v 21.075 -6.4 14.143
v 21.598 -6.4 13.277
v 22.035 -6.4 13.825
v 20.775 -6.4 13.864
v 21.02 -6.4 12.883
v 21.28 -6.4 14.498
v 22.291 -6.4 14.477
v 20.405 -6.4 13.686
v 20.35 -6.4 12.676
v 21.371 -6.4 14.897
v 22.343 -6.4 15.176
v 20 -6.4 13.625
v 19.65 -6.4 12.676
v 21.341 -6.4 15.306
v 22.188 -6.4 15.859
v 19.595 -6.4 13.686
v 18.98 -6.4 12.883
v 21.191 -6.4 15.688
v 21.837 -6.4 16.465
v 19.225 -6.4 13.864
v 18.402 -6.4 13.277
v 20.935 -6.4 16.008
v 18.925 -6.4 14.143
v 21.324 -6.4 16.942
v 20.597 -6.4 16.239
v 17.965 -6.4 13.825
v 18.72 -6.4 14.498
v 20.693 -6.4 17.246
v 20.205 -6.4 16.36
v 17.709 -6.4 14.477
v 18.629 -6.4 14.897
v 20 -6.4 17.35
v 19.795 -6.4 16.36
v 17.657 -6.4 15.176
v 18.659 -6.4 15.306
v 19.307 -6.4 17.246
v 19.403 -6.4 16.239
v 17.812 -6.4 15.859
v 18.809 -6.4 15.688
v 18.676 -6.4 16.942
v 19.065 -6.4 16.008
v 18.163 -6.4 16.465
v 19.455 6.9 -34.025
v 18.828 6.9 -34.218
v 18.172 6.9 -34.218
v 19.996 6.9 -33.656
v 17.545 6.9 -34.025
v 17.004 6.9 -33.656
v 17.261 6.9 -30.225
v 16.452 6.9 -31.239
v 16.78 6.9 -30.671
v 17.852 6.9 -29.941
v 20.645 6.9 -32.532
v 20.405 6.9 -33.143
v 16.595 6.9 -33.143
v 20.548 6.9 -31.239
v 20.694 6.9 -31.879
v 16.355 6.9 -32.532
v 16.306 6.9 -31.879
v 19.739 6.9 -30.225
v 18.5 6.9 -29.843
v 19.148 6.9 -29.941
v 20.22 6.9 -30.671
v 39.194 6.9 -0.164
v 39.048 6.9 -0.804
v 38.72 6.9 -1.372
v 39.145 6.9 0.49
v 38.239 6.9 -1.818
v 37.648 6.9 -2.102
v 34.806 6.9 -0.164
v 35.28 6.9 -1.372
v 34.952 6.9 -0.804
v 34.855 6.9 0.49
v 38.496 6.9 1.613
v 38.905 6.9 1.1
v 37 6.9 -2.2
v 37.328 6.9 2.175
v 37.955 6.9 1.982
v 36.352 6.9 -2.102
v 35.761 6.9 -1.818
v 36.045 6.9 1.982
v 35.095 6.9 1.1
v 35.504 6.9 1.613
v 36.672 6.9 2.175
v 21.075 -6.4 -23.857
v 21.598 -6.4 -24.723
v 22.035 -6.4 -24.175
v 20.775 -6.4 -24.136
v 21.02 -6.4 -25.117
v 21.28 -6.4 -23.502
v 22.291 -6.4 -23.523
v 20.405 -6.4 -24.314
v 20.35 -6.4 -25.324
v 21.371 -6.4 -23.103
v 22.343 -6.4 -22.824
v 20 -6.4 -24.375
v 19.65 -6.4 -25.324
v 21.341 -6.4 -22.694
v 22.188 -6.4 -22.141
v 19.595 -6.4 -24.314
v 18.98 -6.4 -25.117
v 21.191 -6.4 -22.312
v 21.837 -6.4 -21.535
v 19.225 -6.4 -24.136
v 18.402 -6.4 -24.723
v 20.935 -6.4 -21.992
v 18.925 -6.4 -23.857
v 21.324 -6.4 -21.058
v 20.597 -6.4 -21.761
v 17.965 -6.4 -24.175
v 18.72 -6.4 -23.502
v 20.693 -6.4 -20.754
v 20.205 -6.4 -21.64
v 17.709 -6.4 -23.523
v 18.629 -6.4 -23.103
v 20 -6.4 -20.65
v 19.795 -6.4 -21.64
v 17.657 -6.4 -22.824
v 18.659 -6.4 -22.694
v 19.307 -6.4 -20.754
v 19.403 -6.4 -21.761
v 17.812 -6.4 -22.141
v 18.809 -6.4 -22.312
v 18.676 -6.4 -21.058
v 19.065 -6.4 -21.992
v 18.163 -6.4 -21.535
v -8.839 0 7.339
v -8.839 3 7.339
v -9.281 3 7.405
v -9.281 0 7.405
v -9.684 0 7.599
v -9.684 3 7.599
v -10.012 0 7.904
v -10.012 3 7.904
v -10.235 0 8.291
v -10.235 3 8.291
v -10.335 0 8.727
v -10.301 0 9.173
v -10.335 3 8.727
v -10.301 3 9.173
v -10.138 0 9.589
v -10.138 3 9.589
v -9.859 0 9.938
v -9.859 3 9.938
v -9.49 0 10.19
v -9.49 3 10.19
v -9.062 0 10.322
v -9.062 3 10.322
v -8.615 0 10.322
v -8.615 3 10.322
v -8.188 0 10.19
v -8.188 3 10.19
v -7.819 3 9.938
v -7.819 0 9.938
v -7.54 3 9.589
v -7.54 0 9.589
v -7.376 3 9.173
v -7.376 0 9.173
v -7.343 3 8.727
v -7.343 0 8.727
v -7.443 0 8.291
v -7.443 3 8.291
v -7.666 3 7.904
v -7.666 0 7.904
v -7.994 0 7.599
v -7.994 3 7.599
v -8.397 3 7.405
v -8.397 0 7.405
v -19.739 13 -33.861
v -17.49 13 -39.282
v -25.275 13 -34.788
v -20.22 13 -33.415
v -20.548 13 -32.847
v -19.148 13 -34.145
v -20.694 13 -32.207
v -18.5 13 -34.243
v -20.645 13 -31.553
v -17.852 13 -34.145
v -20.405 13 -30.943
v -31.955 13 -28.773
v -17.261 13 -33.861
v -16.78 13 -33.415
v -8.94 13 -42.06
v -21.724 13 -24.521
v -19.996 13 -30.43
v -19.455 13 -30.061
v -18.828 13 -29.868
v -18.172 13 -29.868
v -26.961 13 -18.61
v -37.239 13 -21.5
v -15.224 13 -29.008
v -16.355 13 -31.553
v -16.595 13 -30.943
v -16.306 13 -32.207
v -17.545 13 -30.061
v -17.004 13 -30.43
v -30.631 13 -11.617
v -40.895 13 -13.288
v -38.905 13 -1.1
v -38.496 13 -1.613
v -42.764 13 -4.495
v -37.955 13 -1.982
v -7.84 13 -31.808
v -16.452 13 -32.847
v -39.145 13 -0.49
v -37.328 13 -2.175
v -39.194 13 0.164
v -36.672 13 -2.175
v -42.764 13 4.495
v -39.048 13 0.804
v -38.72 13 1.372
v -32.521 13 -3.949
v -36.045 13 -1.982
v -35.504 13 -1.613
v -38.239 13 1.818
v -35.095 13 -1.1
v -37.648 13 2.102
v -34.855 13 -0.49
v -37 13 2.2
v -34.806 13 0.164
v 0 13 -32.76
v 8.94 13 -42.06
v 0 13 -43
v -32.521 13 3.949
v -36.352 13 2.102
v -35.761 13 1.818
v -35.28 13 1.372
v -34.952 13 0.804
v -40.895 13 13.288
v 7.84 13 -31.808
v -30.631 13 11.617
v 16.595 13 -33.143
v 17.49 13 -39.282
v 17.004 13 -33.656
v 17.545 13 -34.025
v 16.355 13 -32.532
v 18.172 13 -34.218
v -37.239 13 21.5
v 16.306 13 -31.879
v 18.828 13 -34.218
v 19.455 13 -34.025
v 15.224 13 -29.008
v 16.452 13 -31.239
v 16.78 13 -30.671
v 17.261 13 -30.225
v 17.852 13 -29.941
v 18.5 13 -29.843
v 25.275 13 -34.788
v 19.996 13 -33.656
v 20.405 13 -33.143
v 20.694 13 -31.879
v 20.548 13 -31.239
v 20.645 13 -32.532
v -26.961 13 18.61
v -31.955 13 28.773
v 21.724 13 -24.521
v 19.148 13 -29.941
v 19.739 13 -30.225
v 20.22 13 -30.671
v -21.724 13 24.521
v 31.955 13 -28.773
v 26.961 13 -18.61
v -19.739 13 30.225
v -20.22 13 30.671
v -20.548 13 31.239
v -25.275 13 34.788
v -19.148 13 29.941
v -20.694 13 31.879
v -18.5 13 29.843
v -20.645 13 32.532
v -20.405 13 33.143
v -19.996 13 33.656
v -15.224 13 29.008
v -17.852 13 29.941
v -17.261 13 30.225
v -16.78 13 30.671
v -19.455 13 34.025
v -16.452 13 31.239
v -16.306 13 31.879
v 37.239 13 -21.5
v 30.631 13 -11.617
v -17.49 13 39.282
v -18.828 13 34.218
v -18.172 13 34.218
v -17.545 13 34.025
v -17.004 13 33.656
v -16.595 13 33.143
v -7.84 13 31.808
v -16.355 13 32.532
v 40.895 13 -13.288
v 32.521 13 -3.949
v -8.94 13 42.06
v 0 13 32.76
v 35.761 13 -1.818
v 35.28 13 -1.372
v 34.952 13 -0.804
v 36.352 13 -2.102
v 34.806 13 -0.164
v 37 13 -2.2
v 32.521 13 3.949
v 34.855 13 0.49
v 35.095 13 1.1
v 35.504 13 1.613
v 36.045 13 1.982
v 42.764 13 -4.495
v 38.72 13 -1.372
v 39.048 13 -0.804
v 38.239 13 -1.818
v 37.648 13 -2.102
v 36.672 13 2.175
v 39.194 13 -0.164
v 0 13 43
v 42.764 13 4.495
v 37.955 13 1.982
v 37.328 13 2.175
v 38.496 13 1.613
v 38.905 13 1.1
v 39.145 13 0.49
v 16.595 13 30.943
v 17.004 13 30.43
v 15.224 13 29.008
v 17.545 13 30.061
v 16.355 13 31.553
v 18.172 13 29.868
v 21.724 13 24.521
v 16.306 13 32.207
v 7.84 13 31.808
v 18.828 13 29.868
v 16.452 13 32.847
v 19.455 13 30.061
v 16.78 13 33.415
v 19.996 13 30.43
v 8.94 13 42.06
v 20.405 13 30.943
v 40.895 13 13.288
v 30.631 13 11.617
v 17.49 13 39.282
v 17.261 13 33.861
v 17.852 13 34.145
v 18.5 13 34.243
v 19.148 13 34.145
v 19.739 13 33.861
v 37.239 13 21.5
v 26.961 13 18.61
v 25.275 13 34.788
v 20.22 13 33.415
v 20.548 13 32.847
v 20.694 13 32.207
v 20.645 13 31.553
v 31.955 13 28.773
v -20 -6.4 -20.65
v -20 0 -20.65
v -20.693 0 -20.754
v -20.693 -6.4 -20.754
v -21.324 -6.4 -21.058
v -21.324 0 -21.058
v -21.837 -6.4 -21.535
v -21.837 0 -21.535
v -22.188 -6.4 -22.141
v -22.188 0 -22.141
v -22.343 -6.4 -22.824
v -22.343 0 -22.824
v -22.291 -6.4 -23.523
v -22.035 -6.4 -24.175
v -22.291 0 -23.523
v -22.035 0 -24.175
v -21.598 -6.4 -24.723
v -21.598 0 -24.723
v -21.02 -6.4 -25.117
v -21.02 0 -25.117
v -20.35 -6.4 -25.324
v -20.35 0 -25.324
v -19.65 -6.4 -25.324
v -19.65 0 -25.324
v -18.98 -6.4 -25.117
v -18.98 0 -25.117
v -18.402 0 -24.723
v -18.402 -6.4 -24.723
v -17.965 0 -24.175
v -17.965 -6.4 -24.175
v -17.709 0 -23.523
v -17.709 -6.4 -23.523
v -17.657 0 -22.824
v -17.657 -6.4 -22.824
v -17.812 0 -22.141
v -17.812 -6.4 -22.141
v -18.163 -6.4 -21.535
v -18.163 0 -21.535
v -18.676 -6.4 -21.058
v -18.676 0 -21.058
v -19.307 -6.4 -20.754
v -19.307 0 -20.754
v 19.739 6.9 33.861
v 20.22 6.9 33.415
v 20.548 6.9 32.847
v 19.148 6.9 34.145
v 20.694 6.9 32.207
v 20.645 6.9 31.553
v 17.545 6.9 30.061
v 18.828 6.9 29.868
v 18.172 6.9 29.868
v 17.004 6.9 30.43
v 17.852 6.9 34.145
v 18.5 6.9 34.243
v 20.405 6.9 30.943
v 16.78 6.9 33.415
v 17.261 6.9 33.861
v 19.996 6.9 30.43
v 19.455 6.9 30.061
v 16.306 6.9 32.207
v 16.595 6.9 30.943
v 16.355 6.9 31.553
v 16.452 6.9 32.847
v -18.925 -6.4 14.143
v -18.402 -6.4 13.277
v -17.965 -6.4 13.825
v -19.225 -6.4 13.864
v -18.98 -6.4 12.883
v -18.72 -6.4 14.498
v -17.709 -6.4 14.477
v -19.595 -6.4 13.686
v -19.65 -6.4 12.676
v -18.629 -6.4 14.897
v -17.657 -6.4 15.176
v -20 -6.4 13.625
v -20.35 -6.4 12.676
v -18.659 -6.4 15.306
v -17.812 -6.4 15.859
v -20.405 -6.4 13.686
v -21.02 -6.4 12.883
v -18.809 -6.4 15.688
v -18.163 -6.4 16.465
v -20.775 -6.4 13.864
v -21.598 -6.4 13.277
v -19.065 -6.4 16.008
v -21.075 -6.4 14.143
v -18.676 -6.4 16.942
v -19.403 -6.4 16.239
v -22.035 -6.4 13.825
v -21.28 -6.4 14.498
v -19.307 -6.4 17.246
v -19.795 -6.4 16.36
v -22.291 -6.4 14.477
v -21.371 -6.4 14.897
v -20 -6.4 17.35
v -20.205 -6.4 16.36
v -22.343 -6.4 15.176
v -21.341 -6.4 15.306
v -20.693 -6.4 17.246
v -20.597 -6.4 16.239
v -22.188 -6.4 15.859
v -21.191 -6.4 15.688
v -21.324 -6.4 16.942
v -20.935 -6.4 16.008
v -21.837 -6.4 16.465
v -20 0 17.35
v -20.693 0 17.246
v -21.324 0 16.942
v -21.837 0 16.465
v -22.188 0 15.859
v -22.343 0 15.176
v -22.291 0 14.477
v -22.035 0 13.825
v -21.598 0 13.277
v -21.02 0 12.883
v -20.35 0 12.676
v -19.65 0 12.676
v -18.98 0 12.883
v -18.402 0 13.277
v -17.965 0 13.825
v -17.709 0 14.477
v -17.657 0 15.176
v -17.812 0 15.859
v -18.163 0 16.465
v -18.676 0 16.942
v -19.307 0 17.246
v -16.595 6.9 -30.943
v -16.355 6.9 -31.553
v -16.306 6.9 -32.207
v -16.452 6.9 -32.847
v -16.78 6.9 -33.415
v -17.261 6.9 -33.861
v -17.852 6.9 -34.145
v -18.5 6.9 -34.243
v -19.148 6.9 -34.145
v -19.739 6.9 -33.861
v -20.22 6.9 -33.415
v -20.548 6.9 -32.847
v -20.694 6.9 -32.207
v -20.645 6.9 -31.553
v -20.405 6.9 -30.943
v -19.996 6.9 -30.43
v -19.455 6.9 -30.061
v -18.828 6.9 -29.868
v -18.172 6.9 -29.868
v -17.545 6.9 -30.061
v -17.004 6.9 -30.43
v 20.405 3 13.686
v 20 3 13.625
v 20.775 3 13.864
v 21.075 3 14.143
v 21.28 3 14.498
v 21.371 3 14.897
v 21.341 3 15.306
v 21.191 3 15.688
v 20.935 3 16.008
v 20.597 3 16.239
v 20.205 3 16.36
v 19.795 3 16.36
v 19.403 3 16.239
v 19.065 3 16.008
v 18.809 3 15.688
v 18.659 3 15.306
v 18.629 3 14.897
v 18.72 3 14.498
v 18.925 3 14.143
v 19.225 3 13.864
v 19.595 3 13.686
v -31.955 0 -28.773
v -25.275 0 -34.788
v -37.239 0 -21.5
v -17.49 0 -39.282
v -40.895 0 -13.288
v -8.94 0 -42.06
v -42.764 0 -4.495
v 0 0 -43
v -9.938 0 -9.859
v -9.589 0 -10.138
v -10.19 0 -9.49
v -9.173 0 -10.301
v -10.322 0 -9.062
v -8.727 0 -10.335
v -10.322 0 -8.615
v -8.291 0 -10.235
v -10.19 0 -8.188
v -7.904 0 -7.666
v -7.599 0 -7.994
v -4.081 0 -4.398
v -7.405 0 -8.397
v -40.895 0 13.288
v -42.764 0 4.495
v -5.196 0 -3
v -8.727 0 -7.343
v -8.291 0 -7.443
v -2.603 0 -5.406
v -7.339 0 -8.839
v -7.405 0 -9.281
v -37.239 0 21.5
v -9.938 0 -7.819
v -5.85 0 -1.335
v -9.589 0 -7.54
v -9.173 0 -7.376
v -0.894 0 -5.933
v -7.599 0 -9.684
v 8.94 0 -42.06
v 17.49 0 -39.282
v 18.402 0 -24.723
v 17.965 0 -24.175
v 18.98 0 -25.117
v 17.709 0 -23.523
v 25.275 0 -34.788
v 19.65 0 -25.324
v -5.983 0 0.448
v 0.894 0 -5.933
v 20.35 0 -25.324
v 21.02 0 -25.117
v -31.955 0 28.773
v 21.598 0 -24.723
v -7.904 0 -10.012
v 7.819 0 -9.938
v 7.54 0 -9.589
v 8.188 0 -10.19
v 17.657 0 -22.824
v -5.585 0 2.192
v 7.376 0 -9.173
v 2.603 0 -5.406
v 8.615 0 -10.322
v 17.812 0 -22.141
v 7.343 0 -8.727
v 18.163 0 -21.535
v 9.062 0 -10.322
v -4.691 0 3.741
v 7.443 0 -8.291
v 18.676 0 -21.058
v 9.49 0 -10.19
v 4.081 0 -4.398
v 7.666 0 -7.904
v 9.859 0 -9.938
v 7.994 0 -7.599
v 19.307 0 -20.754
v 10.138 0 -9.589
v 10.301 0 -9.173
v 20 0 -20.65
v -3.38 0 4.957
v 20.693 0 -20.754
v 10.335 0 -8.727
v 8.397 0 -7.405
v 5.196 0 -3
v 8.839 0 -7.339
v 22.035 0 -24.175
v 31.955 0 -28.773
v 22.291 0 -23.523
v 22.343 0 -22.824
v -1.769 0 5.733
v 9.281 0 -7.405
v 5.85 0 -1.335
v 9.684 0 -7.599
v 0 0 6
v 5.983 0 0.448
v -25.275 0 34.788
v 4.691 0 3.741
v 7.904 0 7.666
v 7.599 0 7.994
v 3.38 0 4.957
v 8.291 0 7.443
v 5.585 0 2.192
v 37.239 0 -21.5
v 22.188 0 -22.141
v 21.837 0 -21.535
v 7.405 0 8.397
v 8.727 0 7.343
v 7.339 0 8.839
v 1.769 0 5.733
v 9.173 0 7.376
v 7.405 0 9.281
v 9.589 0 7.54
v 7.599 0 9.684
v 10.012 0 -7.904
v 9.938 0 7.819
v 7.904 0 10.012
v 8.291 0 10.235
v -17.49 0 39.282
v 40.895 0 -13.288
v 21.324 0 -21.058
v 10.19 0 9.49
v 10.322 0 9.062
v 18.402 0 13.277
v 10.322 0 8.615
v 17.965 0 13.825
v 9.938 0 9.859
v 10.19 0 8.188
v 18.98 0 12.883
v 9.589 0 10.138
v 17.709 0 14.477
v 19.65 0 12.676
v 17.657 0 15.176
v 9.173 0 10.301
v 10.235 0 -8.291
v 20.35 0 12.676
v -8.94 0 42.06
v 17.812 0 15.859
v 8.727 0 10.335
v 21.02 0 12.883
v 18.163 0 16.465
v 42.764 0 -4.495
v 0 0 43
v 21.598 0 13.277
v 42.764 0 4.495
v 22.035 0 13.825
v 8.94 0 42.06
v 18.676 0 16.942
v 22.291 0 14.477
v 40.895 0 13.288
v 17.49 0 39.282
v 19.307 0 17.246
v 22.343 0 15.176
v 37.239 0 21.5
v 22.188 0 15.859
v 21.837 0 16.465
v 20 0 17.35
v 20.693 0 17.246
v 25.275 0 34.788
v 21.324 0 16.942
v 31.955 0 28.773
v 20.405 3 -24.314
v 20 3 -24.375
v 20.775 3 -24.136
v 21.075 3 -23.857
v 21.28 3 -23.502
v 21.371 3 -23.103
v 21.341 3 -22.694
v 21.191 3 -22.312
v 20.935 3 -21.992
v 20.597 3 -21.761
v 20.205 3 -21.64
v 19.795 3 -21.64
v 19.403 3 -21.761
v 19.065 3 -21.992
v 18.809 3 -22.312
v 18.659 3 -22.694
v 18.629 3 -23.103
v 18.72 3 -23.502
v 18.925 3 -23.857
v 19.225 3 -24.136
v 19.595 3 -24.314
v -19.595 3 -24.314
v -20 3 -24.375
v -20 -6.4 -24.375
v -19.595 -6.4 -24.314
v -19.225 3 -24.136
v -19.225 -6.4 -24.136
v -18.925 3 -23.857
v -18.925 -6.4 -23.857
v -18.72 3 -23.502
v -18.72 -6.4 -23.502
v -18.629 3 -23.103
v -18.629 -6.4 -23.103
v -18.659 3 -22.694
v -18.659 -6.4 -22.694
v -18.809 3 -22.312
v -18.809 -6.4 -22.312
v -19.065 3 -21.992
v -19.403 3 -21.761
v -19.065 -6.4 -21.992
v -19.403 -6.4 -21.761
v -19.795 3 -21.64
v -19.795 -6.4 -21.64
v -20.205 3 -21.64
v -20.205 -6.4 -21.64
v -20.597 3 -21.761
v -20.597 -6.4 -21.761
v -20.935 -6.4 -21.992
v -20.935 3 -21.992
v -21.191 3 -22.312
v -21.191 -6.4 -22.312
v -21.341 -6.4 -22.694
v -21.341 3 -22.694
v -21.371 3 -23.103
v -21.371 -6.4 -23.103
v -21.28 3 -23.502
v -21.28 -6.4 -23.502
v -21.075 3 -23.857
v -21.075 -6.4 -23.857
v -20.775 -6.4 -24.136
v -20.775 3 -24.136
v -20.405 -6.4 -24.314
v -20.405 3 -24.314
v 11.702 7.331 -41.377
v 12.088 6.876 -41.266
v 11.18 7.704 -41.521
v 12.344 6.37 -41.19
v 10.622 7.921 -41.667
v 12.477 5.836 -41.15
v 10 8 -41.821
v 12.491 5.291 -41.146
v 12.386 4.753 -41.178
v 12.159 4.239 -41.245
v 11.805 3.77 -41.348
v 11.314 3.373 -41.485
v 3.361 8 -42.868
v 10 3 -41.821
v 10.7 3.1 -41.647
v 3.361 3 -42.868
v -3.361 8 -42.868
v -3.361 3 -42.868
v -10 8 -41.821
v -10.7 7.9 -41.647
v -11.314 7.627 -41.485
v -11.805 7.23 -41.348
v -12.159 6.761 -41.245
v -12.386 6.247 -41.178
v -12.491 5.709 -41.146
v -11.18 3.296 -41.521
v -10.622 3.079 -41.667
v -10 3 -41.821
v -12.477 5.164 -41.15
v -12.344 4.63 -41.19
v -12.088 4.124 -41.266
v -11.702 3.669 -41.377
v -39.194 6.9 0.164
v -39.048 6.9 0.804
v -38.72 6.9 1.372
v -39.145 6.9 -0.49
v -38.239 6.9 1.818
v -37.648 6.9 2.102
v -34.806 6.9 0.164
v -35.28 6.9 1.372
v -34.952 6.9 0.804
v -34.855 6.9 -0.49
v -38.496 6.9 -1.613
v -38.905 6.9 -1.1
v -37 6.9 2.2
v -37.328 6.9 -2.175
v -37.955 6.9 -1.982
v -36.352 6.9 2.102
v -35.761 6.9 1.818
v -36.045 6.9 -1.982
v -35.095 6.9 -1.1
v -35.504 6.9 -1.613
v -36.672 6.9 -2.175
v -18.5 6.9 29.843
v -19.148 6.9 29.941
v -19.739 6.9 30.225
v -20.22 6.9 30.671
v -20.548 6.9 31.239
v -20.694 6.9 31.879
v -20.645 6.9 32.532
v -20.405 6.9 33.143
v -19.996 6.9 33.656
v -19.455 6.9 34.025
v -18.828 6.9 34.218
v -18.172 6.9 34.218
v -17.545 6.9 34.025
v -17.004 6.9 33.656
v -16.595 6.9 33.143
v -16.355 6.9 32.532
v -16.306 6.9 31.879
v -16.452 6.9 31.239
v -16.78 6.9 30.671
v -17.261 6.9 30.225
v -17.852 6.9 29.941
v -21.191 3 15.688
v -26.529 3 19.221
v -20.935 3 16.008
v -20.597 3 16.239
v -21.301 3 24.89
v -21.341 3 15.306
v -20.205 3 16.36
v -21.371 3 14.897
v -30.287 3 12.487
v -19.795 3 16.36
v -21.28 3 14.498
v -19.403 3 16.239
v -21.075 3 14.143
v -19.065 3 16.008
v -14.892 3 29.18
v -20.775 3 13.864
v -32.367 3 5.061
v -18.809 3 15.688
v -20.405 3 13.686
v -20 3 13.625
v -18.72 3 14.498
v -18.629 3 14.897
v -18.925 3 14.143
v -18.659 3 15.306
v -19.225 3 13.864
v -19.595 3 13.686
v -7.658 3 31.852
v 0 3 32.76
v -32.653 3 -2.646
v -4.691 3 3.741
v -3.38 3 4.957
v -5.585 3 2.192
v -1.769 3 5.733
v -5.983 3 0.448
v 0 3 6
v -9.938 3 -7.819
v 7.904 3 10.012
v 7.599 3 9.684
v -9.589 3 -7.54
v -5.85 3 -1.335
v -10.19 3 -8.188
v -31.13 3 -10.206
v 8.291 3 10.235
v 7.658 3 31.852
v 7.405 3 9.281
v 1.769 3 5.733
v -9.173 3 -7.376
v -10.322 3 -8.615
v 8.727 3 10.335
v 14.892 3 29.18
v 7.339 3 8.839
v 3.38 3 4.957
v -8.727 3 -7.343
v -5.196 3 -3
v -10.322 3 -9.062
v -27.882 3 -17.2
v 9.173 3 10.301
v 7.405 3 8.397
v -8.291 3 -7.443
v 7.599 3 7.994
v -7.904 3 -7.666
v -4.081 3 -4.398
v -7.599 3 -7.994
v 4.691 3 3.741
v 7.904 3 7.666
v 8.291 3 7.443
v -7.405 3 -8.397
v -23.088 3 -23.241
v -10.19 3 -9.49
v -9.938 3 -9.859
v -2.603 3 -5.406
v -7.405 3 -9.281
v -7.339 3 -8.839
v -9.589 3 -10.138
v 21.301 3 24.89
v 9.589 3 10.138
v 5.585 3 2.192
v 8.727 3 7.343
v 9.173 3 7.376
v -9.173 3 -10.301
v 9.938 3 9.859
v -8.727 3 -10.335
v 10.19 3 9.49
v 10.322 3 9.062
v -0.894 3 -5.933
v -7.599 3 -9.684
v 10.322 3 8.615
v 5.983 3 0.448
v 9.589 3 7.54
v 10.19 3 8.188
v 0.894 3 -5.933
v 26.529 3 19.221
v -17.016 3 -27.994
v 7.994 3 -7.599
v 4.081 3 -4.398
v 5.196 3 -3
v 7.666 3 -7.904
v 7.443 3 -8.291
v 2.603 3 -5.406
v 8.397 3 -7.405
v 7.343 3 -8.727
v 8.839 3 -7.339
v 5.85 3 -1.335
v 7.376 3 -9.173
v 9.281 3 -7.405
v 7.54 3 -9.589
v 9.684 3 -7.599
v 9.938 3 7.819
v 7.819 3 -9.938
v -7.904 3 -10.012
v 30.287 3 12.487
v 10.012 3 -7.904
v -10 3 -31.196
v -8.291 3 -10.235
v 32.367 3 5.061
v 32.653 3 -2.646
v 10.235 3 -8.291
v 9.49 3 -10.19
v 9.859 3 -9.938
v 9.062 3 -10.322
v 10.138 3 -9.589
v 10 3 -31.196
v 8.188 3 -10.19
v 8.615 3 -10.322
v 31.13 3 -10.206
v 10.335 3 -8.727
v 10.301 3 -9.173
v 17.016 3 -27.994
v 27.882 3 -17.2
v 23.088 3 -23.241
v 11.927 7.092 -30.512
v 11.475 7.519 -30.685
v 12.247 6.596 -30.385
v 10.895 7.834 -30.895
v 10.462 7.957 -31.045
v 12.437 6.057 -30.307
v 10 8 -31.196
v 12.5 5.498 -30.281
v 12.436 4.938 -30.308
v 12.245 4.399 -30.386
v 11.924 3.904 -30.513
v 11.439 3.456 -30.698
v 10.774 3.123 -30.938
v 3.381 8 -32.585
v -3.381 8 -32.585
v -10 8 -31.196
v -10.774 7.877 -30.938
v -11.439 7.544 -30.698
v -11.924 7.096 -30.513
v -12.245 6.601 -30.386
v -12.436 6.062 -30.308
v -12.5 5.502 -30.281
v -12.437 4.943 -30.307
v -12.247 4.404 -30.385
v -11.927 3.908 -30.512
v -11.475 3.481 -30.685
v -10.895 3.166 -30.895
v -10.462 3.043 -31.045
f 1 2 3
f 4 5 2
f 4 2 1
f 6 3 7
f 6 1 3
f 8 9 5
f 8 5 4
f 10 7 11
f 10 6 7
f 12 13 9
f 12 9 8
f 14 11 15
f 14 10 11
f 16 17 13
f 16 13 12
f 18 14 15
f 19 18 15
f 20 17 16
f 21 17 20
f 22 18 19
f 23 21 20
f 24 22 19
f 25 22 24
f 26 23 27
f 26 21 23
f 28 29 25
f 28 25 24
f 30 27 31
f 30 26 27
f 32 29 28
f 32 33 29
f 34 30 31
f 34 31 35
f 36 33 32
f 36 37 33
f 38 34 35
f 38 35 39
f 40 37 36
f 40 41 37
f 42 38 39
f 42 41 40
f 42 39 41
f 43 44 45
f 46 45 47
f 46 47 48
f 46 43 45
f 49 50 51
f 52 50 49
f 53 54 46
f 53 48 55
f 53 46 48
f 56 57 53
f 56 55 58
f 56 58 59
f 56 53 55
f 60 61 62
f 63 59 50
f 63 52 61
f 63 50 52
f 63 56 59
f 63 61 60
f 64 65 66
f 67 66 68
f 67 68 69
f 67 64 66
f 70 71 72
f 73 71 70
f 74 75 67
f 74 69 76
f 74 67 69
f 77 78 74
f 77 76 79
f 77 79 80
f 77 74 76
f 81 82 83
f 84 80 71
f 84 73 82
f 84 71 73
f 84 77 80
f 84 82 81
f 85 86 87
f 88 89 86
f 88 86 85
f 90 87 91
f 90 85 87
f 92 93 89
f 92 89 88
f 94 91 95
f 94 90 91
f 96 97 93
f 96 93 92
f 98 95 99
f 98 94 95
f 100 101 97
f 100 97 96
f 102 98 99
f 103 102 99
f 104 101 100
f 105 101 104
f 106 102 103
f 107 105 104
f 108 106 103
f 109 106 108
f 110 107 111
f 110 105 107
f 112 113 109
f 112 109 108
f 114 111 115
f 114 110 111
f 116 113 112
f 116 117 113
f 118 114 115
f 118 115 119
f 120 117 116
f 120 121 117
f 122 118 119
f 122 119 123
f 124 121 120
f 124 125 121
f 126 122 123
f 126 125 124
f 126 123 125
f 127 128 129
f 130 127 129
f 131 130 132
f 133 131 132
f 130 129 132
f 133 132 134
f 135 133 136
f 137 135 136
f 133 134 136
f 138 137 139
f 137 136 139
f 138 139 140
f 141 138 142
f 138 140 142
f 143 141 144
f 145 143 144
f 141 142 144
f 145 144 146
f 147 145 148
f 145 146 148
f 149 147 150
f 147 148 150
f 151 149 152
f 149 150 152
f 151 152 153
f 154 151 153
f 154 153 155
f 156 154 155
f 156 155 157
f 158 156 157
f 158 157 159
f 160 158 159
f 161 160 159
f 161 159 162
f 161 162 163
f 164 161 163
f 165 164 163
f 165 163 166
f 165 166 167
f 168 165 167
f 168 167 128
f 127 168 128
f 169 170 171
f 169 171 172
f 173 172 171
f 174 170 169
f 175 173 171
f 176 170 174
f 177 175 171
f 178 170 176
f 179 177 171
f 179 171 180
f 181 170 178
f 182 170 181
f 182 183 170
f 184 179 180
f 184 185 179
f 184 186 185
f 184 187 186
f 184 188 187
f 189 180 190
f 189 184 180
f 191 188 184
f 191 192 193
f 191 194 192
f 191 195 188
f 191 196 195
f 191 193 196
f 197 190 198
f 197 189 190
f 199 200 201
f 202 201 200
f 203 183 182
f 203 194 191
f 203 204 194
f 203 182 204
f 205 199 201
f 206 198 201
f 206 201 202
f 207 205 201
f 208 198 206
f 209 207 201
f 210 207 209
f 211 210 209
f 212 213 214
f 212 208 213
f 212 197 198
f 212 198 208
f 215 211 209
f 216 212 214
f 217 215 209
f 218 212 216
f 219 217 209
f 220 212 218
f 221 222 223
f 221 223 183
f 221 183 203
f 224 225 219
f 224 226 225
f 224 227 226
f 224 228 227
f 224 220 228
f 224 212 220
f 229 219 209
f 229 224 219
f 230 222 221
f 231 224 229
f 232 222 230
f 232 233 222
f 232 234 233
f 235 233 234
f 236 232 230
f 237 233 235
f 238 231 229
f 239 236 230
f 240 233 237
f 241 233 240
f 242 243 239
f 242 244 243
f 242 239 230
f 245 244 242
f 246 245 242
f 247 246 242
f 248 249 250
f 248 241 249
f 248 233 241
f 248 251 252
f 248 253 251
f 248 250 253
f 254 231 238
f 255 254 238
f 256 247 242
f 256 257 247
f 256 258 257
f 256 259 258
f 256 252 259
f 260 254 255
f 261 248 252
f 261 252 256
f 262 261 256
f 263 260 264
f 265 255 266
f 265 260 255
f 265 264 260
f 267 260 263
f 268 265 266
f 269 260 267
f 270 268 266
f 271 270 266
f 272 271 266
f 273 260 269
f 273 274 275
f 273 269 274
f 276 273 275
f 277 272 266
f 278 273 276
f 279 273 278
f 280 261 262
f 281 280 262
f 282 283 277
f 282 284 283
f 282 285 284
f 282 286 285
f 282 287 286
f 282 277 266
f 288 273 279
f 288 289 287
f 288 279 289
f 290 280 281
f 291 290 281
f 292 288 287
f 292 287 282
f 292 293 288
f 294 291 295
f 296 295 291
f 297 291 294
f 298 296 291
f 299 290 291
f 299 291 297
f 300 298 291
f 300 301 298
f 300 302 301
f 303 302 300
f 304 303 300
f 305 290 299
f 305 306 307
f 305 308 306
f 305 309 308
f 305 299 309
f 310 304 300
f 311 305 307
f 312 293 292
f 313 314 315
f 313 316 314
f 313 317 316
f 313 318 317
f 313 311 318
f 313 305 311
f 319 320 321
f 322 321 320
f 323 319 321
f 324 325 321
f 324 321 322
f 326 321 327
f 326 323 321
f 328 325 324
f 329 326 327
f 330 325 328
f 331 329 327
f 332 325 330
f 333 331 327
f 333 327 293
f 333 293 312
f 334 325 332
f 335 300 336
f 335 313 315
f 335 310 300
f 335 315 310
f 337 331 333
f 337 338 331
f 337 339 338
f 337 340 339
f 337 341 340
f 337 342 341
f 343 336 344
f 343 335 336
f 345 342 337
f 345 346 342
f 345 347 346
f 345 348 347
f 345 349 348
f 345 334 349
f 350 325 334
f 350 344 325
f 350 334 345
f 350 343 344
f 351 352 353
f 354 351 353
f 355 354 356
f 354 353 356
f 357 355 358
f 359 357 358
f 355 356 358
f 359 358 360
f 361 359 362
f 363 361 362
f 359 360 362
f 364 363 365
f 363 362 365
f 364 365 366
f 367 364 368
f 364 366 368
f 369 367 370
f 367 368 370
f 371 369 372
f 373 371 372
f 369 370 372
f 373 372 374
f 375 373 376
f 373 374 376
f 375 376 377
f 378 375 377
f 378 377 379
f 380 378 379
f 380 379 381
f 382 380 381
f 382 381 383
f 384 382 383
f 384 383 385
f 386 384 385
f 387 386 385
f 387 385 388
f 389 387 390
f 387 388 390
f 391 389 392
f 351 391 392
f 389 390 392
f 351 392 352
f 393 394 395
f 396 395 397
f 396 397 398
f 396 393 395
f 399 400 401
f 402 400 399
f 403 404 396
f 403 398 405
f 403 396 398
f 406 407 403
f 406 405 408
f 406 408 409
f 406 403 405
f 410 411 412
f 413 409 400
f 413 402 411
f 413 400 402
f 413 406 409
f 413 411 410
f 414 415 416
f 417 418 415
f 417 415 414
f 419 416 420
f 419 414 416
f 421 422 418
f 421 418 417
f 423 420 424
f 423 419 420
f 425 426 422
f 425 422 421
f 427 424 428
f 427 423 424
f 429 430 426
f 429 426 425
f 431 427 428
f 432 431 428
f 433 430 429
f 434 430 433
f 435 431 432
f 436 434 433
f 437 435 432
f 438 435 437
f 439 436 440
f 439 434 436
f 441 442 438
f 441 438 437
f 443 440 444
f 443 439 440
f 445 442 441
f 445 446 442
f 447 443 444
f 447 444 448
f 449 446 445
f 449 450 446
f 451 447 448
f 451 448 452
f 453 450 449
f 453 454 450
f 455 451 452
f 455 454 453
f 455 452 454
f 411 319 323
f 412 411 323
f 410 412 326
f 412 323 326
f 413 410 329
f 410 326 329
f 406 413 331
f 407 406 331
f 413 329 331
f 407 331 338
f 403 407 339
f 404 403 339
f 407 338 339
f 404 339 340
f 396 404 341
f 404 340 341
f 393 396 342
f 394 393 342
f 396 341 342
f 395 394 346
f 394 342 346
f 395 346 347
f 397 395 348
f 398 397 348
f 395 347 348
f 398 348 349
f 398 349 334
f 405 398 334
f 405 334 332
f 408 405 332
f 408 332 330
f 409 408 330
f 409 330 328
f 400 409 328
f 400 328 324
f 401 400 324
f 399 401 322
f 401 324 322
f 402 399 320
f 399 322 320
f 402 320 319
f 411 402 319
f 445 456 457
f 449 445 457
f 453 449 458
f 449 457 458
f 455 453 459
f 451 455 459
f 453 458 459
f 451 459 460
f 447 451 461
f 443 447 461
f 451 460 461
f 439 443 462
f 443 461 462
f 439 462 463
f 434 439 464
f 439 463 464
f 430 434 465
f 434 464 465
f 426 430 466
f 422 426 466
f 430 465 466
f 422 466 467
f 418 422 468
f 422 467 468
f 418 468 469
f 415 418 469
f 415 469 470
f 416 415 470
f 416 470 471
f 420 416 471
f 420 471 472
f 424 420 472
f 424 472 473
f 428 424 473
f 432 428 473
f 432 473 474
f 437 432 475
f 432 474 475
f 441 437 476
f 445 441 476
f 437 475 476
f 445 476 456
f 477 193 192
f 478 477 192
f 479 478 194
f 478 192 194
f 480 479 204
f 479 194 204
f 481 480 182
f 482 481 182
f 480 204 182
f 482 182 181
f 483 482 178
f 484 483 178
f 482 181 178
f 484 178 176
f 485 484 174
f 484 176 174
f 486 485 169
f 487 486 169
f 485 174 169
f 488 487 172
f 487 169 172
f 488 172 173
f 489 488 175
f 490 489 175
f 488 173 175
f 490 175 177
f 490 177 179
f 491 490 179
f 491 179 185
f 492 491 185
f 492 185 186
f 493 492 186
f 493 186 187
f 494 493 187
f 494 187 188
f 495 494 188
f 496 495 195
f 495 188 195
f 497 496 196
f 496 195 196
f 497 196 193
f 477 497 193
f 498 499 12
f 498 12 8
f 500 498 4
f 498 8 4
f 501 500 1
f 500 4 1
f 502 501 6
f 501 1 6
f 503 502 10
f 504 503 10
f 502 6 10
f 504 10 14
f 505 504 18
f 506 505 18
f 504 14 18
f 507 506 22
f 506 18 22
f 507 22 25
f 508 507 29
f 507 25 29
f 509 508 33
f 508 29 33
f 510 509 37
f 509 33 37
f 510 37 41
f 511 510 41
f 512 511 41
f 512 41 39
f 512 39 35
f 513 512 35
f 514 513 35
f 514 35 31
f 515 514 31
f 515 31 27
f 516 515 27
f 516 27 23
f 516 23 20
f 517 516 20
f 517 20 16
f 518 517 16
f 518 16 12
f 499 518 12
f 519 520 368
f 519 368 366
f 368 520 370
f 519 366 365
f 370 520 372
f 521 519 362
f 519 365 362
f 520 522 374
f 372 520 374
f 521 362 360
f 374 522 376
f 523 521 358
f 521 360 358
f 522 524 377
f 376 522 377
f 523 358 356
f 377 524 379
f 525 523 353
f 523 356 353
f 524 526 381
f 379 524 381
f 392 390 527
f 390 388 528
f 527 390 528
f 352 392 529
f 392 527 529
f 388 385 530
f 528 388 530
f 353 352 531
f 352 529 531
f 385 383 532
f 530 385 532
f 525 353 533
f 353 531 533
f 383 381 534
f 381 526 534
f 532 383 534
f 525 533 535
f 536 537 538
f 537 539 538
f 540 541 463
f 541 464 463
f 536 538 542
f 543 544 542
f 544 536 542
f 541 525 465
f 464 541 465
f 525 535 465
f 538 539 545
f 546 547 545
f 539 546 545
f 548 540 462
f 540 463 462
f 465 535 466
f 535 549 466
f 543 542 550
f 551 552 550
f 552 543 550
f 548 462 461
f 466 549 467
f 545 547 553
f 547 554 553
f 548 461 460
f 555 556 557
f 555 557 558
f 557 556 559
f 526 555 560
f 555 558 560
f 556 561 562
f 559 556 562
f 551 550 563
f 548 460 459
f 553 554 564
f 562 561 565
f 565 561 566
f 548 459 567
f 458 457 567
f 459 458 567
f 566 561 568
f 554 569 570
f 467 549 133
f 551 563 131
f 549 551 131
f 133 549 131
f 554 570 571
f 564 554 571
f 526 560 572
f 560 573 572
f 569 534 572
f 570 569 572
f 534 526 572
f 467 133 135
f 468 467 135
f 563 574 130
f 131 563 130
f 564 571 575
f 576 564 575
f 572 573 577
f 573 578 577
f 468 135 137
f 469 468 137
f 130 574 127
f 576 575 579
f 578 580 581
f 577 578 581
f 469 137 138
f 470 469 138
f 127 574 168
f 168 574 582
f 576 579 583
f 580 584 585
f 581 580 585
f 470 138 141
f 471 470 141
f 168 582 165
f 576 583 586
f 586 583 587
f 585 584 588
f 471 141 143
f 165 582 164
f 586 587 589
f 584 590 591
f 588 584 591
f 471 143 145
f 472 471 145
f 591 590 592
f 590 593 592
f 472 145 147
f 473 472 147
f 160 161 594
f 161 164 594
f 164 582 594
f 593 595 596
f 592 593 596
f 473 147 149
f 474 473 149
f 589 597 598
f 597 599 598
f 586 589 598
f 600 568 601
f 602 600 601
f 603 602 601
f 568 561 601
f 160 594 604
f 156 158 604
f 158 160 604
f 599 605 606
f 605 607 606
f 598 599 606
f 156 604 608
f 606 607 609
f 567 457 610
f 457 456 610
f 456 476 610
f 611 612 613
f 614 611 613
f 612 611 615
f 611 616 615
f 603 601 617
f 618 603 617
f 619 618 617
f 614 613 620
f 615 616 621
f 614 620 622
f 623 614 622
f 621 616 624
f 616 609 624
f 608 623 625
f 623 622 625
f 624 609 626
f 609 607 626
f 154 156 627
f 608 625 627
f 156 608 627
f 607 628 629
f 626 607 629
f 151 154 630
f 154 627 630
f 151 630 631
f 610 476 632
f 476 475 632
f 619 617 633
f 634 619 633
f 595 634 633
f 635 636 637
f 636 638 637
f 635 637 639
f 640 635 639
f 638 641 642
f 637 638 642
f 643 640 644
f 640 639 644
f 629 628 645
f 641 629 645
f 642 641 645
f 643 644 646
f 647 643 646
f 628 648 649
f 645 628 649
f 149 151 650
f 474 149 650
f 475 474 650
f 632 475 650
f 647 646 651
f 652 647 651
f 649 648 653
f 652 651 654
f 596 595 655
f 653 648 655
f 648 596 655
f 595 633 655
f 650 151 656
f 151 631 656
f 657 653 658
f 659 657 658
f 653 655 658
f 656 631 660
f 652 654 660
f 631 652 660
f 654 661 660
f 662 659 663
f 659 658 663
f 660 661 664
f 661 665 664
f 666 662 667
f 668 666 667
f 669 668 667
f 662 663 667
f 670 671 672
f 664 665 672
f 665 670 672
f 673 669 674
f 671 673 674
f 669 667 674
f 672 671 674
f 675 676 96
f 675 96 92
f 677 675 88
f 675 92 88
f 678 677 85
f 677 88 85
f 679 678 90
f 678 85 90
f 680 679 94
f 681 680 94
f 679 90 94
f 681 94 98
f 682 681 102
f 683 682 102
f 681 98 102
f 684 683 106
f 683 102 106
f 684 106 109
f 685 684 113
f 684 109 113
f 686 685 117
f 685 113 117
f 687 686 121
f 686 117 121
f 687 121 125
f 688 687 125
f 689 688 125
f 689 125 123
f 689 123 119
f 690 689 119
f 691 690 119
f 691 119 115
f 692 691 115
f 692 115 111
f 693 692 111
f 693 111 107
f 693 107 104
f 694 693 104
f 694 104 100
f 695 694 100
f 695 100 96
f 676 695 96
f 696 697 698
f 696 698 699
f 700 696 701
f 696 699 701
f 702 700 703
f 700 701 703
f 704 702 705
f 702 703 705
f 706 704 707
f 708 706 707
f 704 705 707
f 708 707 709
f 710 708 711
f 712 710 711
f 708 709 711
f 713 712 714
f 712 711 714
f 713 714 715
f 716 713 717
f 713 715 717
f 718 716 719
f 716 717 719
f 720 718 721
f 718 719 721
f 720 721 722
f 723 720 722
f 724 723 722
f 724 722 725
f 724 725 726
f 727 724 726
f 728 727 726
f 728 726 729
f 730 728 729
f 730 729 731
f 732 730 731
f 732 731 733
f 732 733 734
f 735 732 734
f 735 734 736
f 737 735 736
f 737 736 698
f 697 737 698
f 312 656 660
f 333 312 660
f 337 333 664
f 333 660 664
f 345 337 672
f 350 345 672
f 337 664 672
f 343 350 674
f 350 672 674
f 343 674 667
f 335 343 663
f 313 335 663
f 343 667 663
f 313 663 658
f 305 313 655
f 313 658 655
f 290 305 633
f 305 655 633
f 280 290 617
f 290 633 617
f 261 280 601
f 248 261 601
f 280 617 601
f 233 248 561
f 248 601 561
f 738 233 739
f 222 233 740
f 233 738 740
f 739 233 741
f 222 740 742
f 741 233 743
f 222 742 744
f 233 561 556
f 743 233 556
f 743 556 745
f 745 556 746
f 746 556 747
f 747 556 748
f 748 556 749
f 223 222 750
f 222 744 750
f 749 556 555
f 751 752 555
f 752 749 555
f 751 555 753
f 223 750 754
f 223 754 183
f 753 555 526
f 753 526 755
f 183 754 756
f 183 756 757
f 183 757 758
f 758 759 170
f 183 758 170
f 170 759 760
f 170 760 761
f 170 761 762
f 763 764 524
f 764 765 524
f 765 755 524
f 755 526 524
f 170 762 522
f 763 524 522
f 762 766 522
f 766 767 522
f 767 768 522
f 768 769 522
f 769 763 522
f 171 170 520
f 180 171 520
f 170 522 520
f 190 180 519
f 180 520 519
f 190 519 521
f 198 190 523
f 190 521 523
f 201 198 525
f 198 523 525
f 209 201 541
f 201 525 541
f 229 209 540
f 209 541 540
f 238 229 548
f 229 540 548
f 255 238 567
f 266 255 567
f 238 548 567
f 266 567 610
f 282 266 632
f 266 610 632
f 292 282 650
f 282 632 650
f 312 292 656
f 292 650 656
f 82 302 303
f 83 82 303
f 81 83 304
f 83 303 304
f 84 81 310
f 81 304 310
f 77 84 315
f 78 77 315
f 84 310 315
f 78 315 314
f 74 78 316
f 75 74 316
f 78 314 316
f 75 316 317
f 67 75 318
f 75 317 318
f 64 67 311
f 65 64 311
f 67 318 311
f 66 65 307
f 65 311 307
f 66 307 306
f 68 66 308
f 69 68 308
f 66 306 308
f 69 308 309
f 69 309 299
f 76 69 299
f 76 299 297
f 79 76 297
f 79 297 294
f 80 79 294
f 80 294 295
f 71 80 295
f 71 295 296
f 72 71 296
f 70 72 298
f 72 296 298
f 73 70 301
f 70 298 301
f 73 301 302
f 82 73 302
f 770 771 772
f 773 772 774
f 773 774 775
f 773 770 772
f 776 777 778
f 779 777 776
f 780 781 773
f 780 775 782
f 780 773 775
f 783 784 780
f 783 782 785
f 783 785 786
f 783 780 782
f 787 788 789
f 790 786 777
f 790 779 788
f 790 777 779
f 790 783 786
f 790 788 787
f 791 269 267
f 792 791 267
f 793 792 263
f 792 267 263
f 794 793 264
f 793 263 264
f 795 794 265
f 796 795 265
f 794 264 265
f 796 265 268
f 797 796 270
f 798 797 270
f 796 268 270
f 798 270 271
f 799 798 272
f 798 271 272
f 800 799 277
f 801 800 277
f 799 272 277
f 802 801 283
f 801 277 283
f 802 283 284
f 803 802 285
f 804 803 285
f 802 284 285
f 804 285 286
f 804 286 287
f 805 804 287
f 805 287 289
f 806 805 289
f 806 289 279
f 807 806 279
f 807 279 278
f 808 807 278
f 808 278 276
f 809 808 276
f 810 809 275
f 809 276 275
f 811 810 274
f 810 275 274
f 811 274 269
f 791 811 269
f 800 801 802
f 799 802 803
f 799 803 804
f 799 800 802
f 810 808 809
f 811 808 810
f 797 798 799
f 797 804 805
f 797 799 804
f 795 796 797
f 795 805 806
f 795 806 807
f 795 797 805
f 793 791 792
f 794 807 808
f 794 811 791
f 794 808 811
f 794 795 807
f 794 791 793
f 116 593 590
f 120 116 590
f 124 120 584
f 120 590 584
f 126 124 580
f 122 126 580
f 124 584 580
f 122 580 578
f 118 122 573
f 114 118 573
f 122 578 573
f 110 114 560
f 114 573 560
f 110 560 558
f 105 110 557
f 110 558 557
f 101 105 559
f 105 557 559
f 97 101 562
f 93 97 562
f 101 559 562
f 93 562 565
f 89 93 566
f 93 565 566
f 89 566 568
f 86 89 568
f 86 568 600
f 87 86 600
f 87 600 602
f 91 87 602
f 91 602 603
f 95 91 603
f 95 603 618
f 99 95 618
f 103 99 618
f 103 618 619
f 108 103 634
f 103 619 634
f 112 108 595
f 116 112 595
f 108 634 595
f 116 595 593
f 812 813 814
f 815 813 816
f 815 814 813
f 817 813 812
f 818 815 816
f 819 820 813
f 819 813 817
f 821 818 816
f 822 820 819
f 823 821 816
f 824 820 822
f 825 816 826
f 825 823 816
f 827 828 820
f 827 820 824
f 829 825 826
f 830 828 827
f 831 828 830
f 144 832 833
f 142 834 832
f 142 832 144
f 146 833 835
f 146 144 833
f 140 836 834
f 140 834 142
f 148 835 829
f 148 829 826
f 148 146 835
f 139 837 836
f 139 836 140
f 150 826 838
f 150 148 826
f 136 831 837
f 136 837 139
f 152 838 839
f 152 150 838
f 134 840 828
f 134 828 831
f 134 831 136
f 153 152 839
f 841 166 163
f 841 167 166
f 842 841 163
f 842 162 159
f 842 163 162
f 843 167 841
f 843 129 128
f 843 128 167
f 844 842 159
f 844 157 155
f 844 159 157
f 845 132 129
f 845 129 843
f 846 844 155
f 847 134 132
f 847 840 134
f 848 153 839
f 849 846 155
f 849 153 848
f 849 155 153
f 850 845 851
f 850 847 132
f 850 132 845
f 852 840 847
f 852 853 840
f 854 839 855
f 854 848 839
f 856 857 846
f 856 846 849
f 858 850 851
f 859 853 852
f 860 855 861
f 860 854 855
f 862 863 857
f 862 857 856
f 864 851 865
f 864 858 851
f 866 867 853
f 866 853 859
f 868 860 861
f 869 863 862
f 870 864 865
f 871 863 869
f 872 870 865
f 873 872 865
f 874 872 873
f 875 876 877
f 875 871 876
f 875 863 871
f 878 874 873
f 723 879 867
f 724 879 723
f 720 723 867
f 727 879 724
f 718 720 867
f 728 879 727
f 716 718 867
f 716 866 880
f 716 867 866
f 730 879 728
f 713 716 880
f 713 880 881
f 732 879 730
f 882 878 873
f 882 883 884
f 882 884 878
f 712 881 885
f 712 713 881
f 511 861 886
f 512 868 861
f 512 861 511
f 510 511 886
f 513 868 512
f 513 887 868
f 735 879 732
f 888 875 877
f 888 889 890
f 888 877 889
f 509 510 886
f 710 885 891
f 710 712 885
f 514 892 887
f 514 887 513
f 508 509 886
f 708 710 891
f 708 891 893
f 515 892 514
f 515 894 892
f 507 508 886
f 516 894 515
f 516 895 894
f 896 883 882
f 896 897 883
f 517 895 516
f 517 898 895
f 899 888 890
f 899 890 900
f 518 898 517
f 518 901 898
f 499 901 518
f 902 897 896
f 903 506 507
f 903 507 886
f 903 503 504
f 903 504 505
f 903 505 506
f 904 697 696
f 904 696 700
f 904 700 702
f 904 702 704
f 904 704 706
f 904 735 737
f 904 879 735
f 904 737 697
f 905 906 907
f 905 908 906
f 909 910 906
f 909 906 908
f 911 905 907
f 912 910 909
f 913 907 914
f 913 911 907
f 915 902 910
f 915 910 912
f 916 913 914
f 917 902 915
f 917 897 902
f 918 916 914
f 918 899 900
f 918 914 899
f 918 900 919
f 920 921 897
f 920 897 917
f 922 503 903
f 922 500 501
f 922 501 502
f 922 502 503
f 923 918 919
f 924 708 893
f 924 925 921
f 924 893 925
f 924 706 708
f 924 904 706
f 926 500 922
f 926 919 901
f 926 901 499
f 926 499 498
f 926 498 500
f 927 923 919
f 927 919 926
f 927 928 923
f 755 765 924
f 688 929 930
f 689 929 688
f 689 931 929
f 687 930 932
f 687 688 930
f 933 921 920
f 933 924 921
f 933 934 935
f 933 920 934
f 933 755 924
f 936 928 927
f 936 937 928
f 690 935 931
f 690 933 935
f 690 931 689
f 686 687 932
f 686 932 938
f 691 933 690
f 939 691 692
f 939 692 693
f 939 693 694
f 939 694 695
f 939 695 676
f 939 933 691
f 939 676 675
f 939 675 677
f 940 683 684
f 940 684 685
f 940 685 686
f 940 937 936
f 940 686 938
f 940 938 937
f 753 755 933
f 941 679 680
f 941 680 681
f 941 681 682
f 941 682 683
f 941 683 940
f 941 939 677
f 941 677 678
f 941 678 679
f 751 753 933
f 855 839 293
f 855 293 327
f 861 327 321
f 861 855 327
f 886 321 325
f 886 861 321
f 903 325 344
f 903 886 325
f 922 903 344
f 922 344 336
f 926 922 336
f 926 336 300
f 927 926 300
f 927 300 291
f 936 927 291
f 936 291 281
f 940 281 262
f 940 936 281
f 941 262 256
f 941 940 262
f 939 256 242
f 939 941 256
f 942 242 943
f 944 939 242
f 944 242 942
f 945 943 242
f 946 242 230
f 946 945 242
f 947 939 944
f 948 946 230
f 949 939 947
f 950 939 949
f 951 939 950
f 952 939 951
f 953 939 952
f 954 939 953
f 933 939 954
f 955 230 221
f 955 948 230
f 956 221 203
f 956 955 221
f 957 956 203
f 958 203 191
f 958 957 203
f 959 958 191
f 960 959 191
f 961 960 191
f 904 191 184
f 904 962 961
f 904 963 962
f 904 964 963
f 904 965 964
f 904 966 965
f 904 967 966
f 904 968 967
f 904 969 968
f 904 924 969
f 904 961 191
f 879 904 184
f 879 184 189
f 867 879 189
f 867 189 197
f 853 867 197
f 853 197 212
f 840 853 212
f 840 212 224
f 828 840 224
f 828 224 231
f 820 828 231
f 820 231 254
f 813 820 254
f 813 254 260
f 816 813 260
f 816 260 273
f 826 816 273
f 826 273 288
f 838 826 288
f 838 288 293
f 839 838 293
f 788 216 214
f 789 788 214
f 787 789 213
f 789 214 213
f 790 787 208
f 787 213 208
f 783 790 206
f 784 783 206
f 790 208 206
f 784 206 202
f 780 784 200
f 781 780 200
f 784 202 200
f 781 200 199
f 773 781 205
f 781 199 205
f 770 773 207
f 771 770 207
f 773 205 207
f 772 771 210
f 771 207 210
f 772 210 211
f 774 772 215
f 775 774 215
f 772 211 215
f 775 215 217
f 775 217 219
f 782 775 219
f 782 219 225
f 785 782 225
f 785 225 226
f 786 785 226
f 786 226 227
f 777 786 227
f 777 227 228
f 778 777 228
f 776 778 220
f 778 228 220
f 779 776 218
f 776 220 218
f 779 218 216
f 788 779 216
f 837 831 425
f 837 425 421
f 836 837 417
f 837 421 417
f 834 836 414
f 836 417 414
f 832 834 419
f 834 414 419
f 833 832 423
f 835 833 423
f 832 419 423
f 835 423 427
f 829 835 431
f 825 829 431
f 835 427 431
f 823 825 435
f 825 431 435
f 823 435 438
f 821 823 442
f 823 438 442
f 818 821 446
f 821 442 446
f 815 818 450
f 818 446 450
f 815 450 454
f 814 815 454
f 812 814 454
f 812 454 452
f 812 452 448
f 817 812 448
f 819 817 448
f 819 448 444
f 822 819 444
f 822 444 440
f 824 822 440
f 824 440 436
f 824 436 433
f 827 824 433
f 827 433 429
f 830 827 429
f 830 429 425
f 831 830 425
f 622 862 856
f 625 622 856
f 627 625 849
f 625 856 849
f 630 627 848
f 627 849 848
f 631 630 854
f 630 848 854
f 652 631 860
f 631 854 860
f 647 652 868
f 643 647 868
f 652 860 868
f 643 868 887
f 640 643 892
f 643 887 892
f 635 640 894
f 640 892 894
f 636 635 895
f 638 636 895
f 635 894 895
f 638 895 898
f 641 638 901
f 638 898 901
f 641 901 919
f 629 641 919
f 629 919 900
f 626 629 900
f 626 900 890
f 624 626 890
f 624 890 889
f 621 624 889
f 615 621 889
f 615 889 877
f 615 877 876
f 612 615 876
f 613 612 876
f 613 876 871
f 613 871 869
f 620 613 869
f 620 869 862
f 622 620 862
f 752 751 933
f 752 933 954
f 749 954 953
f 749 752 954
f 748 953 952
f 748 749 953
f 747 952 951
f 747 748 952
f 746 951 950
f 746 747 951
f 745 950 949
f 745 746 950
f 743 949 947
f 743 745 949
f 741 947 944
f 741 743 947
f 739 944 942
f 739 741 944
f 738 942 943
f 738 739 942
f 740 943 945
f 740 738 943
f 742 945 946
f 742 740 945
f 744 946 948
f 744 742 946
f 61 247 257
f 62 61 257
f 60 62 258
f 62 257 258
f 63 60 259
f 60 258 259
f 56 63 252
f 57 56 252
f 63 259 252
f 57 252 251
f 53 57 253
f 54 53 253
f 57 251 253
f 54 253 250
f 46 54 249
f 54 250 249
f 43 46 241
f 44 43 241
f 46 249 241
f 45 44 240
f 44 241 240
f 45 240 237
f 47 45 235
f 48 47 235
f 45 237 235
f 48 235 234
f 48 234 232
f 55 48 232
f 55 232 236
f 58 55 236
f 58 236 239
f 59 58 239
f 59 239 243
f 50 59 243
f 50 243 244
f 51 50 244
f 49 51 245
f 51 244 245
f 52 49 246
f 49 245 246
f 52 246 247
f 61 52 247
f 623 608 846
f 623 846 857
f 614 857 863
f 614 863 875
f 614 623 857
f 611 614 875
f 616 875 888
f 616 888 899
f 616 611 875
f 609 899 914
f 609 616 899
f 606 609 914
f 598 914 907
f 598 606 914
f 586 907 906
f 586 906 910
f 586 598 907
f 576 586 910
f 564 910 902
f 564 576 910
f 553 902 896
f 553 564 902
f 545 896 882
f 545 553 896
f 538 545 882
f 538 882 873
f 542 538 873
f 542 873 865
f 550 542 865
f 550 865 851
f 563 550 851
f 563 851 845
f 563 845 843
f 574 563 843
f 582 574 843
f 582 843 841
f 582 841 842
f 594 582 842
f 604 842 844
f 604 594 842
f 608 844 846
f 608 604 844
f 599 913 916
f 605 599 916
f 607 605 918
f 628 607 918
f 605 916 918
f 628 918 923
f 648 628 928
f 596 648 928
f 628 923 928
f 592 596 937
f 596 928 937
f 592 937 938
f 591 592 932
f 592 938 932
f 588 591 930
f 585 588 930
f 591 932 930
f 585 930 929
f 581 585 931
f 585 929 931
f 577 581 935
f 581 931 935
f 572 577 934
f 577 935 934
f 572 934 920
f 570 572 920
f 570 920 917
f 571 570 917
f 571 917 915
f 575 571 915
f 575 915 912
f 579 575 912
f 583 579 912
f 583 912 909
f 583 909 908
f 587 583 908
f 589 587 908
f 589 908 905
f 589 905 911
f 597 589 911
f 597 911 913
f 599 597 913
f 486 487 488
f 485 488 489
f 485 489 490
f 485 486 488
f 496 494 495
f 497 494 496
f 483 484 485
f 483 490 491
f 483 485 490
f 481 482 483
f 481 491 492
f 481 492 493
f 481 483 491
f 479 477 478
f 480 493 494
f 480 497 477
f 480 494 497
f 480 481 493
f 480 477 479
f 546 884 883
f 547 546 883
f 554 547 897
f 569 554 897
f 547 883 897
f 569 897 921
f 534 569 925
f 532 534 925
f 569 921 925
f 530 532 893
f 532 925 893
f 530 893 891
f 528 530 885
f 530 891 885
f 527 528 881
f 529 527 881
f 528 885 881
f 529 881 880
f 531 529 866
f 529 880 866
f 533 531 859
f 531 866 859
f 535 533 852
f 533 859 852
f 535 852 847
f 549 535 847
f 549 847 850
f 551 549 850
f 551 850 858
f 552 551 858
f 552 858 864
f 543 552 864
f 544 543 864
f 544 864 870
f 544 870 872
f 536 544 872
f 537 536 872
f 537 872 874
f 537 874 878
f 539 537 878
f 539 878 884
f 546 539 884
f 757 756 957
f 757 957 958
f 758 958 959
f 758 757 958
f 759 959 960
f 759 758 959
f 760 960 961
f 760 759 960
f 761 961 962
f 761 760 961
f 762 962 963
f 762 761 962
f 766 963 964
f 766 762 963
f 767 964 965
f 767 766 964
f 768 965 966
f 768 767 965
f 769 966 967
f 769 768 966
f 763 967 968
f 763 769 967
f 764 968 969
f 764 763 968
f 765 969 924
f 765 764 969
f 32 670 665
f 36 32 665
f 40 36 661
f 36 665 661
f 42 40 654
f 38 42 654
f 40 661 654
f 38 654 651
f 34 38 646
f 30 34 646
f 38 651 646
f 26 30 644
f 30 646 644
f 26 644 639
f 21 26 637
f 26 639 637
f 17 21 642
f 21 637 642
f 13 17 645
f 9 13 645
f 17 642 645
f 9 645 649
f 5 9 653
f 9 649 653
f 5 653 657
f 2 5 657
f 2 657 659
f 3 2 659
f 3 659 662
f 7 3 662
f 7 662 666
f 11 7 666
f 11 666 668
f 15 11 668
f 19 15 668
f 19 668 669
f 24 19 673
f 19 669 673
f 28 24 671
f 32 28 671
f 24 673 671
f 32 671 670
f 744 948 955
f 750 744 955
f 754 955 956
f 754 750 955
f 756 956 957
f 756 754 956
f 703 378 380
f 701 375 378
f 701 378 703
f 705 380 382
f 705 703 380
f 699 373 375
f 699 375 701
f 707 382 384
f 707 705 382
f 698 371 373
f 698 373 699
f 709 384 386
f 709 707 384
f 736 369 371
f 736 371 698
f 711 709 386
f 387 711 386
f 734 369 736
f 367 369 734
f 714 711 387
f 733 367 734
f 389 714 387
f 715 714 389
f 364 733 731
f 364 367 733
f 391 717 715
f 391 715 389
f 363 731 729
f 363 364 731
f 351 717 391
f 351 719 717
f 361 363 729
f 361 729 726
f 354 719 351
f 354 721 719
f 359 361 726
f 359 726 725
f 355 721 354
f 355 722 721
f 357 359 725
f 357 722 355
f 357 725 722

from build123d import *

# Parameters (mm, degrees)
SKETCH_1_R          = 43
SKETCH_1_R_2        = 6
EXTRUDE_1_DEPTH     = 3
SKETCH_14_R         = 43
SKETCH_14_R_2       = 32.76
EXTRUDE_5_DEPTH     = 10
SKETCH_17_R         = 2.35
EXTRUDE_6_DEPTH     = 6.4
SKETCH_18_R         = 1.375
CUT_EXTRUDE_5_DEPTH = 64.83071361
SKETCH_23_R         = 2.2
CUT_EXTRUDE_6_DEPTH = 6.1
CUT_EXTRUDE1_DEPTH  = 20
SKETCH_26_R         = 1.5
CUT_EXTRUDE3_DEPTH  = 6.1
CIRPATTERN1_COUNT   = 4
CIRPATTERN2_COUNT   = 6


with BuildPart() as part:
    # 스케치1 → 보스-돌출1 (new body)
    with BuildSketch(Plane(origin=(0, 0, 0), x_dir=(1, 0, 0), z_dir=(0, 1, 0))):
        with Locations(Location((0, 0, 0), (0, 0, 270))):
            Circle(SKETCH_1_R)
        with Locations(Location((0, 0, 0), (0, 0, 270))):
            Circle(SKETCH_1_R_2, mode=Mode.SUBTRACT)
    extrude(amount=EXTRUDE_1_DEPTH)

    # 스케치14 → 보스-돌출5 (add)
    with BuildSketch(Plane(origin=(0, 3, 0), x_dir=(1, 0, 0), z_dir=(0, 1, 0))):
        with Locations(Location((0, 0, 0), (0, 0, 270))):
            Circle(SKETCH_14_R)
        with Locations(Location((0, 0, 0), (0, 0, 270))):
            Circle(SKETCH_14_R_2, mode=Mode.SUBTRACT)
    extrude(amount=EXTRUDE_5_DEPTH)

    # 스케치17 → 보스-돌출6 (add)
    with BuildSketch(Plane.XZ):
        with Locations(Location((20, 15, 0), (0, 0, 90))):
            Circle(SKETCH_17_R)
        with Locations(Location((-20, 15, 0), (0, 0, 90))):
            Circle(SKETCH_17_R)
        with Locations(Location((20, -23, 0), (0, 0, 90))):
            Circle(SKETCH_17_R)
        with Locations(Location((-20, -23, 0), (0, 0, 90))):
            Circle(SKETCH_17_R)
    extrude(amount=EXTRUDE_6_DEPTH)

    # 스케치18 → 컷-돌출5 (cut, through all)
    with BuildSketch(Plane.XZ.offset(6.4)):
        with Locations(Location((-20, 15, 0), (0, 0, 270))):
            Circle(SKETCH_18_R)
        with Locations(Location((20, 15, 0), (0, 0, 270))):
            Circle(SKETCH_18_R)
        with Locations(Location((20, -23, 0), (0, 0, 270))):
            Circle(SKETCH_18_R)
        with Locations(Location((-20, -23, 0), (0, 0, 270))):
            Circle(SKETCH_18_R)
    extrude(amount=-CUT_EXTRUDE_5_DEPTH, mode=Mode.SUBTRACT)

    # 스케치23 → 컷-돌출6 (cut)
    with BuildSketch(Plane(origin=(0, 13, 0), x_dir=(1, 0, 0), z_dir=(0, 1, 0))):
        with Locations(Location((18.5, 32.04293994, 0), (0, 0, 270))):
            Circle(SKETCH_23_R)
    cut_extrude_6 = extrude(amount=-CUT_EXTRUDE_6_DEPTH, mode=Mode.SUBTRACT)

    # Sketch2 → Cut-Extrude1 (cut)
    with BuildSketch(Plane(origin=(0, 0, -43), x_dir=(-1, 0, 0), z_dir=(0, 0, -1))):
        with BuildLine():
            Line((-10, 8), (10, 8))
            ThreePointArc((10, 8), (12.5, 5.5), (10, 3))
            Line((10, 3), (-10, 3))
            ThreePointArc((-10, 3), (-12.5, 5.5), (-10, 8))
        make_face()
    extrude(amount=-CUT_EXTRUDE1_DEPTH, mode=Mode.SUBTRACT)

    # 스케치26 → Cut-Extrude3 (cut)
    with BuildSketch(Plane(origin=(0, 3, 0), x_dir=(1, 0, 0), z_dir=(0, 1, 0))):
        with Locations(Location((8.838834765, 8.838834765, 0), (0, 0, 270))):
            Circle(SKETCH_26_R)
    cut_extrude3 = extrude(amount=-CUT_EXTRUDE3_DEPTH, mode=Mode.SUBTRACT)

    # CirPattern1: Cut-Extrude3 ×4 about axis
    cirpattern1_axis = Axis((0, 0, 0), (0, 1, 0))
    for i in range(1, CIRPATTERN1_COUNT):
        add(cut_extrude3.rotate(cirpattern1_axis, i * 360 / CIRPATTERN1_COUNT), mode=Mode.SUBTRACT)

    # CirPattern2: 컷-돌출6 ×6 about axis
    cirpattern2_axis = Axis((0, 0, 0), (0, 1, 0))
    for i in range(1, CIRPATTERN2_COUNT):
        add(cut_extrude_6.rotate(cirpattern2_axis, i * 360 / CIRPATTERN2_COUNT), mode=Mode.SUBTRACT)


solid = part.part
